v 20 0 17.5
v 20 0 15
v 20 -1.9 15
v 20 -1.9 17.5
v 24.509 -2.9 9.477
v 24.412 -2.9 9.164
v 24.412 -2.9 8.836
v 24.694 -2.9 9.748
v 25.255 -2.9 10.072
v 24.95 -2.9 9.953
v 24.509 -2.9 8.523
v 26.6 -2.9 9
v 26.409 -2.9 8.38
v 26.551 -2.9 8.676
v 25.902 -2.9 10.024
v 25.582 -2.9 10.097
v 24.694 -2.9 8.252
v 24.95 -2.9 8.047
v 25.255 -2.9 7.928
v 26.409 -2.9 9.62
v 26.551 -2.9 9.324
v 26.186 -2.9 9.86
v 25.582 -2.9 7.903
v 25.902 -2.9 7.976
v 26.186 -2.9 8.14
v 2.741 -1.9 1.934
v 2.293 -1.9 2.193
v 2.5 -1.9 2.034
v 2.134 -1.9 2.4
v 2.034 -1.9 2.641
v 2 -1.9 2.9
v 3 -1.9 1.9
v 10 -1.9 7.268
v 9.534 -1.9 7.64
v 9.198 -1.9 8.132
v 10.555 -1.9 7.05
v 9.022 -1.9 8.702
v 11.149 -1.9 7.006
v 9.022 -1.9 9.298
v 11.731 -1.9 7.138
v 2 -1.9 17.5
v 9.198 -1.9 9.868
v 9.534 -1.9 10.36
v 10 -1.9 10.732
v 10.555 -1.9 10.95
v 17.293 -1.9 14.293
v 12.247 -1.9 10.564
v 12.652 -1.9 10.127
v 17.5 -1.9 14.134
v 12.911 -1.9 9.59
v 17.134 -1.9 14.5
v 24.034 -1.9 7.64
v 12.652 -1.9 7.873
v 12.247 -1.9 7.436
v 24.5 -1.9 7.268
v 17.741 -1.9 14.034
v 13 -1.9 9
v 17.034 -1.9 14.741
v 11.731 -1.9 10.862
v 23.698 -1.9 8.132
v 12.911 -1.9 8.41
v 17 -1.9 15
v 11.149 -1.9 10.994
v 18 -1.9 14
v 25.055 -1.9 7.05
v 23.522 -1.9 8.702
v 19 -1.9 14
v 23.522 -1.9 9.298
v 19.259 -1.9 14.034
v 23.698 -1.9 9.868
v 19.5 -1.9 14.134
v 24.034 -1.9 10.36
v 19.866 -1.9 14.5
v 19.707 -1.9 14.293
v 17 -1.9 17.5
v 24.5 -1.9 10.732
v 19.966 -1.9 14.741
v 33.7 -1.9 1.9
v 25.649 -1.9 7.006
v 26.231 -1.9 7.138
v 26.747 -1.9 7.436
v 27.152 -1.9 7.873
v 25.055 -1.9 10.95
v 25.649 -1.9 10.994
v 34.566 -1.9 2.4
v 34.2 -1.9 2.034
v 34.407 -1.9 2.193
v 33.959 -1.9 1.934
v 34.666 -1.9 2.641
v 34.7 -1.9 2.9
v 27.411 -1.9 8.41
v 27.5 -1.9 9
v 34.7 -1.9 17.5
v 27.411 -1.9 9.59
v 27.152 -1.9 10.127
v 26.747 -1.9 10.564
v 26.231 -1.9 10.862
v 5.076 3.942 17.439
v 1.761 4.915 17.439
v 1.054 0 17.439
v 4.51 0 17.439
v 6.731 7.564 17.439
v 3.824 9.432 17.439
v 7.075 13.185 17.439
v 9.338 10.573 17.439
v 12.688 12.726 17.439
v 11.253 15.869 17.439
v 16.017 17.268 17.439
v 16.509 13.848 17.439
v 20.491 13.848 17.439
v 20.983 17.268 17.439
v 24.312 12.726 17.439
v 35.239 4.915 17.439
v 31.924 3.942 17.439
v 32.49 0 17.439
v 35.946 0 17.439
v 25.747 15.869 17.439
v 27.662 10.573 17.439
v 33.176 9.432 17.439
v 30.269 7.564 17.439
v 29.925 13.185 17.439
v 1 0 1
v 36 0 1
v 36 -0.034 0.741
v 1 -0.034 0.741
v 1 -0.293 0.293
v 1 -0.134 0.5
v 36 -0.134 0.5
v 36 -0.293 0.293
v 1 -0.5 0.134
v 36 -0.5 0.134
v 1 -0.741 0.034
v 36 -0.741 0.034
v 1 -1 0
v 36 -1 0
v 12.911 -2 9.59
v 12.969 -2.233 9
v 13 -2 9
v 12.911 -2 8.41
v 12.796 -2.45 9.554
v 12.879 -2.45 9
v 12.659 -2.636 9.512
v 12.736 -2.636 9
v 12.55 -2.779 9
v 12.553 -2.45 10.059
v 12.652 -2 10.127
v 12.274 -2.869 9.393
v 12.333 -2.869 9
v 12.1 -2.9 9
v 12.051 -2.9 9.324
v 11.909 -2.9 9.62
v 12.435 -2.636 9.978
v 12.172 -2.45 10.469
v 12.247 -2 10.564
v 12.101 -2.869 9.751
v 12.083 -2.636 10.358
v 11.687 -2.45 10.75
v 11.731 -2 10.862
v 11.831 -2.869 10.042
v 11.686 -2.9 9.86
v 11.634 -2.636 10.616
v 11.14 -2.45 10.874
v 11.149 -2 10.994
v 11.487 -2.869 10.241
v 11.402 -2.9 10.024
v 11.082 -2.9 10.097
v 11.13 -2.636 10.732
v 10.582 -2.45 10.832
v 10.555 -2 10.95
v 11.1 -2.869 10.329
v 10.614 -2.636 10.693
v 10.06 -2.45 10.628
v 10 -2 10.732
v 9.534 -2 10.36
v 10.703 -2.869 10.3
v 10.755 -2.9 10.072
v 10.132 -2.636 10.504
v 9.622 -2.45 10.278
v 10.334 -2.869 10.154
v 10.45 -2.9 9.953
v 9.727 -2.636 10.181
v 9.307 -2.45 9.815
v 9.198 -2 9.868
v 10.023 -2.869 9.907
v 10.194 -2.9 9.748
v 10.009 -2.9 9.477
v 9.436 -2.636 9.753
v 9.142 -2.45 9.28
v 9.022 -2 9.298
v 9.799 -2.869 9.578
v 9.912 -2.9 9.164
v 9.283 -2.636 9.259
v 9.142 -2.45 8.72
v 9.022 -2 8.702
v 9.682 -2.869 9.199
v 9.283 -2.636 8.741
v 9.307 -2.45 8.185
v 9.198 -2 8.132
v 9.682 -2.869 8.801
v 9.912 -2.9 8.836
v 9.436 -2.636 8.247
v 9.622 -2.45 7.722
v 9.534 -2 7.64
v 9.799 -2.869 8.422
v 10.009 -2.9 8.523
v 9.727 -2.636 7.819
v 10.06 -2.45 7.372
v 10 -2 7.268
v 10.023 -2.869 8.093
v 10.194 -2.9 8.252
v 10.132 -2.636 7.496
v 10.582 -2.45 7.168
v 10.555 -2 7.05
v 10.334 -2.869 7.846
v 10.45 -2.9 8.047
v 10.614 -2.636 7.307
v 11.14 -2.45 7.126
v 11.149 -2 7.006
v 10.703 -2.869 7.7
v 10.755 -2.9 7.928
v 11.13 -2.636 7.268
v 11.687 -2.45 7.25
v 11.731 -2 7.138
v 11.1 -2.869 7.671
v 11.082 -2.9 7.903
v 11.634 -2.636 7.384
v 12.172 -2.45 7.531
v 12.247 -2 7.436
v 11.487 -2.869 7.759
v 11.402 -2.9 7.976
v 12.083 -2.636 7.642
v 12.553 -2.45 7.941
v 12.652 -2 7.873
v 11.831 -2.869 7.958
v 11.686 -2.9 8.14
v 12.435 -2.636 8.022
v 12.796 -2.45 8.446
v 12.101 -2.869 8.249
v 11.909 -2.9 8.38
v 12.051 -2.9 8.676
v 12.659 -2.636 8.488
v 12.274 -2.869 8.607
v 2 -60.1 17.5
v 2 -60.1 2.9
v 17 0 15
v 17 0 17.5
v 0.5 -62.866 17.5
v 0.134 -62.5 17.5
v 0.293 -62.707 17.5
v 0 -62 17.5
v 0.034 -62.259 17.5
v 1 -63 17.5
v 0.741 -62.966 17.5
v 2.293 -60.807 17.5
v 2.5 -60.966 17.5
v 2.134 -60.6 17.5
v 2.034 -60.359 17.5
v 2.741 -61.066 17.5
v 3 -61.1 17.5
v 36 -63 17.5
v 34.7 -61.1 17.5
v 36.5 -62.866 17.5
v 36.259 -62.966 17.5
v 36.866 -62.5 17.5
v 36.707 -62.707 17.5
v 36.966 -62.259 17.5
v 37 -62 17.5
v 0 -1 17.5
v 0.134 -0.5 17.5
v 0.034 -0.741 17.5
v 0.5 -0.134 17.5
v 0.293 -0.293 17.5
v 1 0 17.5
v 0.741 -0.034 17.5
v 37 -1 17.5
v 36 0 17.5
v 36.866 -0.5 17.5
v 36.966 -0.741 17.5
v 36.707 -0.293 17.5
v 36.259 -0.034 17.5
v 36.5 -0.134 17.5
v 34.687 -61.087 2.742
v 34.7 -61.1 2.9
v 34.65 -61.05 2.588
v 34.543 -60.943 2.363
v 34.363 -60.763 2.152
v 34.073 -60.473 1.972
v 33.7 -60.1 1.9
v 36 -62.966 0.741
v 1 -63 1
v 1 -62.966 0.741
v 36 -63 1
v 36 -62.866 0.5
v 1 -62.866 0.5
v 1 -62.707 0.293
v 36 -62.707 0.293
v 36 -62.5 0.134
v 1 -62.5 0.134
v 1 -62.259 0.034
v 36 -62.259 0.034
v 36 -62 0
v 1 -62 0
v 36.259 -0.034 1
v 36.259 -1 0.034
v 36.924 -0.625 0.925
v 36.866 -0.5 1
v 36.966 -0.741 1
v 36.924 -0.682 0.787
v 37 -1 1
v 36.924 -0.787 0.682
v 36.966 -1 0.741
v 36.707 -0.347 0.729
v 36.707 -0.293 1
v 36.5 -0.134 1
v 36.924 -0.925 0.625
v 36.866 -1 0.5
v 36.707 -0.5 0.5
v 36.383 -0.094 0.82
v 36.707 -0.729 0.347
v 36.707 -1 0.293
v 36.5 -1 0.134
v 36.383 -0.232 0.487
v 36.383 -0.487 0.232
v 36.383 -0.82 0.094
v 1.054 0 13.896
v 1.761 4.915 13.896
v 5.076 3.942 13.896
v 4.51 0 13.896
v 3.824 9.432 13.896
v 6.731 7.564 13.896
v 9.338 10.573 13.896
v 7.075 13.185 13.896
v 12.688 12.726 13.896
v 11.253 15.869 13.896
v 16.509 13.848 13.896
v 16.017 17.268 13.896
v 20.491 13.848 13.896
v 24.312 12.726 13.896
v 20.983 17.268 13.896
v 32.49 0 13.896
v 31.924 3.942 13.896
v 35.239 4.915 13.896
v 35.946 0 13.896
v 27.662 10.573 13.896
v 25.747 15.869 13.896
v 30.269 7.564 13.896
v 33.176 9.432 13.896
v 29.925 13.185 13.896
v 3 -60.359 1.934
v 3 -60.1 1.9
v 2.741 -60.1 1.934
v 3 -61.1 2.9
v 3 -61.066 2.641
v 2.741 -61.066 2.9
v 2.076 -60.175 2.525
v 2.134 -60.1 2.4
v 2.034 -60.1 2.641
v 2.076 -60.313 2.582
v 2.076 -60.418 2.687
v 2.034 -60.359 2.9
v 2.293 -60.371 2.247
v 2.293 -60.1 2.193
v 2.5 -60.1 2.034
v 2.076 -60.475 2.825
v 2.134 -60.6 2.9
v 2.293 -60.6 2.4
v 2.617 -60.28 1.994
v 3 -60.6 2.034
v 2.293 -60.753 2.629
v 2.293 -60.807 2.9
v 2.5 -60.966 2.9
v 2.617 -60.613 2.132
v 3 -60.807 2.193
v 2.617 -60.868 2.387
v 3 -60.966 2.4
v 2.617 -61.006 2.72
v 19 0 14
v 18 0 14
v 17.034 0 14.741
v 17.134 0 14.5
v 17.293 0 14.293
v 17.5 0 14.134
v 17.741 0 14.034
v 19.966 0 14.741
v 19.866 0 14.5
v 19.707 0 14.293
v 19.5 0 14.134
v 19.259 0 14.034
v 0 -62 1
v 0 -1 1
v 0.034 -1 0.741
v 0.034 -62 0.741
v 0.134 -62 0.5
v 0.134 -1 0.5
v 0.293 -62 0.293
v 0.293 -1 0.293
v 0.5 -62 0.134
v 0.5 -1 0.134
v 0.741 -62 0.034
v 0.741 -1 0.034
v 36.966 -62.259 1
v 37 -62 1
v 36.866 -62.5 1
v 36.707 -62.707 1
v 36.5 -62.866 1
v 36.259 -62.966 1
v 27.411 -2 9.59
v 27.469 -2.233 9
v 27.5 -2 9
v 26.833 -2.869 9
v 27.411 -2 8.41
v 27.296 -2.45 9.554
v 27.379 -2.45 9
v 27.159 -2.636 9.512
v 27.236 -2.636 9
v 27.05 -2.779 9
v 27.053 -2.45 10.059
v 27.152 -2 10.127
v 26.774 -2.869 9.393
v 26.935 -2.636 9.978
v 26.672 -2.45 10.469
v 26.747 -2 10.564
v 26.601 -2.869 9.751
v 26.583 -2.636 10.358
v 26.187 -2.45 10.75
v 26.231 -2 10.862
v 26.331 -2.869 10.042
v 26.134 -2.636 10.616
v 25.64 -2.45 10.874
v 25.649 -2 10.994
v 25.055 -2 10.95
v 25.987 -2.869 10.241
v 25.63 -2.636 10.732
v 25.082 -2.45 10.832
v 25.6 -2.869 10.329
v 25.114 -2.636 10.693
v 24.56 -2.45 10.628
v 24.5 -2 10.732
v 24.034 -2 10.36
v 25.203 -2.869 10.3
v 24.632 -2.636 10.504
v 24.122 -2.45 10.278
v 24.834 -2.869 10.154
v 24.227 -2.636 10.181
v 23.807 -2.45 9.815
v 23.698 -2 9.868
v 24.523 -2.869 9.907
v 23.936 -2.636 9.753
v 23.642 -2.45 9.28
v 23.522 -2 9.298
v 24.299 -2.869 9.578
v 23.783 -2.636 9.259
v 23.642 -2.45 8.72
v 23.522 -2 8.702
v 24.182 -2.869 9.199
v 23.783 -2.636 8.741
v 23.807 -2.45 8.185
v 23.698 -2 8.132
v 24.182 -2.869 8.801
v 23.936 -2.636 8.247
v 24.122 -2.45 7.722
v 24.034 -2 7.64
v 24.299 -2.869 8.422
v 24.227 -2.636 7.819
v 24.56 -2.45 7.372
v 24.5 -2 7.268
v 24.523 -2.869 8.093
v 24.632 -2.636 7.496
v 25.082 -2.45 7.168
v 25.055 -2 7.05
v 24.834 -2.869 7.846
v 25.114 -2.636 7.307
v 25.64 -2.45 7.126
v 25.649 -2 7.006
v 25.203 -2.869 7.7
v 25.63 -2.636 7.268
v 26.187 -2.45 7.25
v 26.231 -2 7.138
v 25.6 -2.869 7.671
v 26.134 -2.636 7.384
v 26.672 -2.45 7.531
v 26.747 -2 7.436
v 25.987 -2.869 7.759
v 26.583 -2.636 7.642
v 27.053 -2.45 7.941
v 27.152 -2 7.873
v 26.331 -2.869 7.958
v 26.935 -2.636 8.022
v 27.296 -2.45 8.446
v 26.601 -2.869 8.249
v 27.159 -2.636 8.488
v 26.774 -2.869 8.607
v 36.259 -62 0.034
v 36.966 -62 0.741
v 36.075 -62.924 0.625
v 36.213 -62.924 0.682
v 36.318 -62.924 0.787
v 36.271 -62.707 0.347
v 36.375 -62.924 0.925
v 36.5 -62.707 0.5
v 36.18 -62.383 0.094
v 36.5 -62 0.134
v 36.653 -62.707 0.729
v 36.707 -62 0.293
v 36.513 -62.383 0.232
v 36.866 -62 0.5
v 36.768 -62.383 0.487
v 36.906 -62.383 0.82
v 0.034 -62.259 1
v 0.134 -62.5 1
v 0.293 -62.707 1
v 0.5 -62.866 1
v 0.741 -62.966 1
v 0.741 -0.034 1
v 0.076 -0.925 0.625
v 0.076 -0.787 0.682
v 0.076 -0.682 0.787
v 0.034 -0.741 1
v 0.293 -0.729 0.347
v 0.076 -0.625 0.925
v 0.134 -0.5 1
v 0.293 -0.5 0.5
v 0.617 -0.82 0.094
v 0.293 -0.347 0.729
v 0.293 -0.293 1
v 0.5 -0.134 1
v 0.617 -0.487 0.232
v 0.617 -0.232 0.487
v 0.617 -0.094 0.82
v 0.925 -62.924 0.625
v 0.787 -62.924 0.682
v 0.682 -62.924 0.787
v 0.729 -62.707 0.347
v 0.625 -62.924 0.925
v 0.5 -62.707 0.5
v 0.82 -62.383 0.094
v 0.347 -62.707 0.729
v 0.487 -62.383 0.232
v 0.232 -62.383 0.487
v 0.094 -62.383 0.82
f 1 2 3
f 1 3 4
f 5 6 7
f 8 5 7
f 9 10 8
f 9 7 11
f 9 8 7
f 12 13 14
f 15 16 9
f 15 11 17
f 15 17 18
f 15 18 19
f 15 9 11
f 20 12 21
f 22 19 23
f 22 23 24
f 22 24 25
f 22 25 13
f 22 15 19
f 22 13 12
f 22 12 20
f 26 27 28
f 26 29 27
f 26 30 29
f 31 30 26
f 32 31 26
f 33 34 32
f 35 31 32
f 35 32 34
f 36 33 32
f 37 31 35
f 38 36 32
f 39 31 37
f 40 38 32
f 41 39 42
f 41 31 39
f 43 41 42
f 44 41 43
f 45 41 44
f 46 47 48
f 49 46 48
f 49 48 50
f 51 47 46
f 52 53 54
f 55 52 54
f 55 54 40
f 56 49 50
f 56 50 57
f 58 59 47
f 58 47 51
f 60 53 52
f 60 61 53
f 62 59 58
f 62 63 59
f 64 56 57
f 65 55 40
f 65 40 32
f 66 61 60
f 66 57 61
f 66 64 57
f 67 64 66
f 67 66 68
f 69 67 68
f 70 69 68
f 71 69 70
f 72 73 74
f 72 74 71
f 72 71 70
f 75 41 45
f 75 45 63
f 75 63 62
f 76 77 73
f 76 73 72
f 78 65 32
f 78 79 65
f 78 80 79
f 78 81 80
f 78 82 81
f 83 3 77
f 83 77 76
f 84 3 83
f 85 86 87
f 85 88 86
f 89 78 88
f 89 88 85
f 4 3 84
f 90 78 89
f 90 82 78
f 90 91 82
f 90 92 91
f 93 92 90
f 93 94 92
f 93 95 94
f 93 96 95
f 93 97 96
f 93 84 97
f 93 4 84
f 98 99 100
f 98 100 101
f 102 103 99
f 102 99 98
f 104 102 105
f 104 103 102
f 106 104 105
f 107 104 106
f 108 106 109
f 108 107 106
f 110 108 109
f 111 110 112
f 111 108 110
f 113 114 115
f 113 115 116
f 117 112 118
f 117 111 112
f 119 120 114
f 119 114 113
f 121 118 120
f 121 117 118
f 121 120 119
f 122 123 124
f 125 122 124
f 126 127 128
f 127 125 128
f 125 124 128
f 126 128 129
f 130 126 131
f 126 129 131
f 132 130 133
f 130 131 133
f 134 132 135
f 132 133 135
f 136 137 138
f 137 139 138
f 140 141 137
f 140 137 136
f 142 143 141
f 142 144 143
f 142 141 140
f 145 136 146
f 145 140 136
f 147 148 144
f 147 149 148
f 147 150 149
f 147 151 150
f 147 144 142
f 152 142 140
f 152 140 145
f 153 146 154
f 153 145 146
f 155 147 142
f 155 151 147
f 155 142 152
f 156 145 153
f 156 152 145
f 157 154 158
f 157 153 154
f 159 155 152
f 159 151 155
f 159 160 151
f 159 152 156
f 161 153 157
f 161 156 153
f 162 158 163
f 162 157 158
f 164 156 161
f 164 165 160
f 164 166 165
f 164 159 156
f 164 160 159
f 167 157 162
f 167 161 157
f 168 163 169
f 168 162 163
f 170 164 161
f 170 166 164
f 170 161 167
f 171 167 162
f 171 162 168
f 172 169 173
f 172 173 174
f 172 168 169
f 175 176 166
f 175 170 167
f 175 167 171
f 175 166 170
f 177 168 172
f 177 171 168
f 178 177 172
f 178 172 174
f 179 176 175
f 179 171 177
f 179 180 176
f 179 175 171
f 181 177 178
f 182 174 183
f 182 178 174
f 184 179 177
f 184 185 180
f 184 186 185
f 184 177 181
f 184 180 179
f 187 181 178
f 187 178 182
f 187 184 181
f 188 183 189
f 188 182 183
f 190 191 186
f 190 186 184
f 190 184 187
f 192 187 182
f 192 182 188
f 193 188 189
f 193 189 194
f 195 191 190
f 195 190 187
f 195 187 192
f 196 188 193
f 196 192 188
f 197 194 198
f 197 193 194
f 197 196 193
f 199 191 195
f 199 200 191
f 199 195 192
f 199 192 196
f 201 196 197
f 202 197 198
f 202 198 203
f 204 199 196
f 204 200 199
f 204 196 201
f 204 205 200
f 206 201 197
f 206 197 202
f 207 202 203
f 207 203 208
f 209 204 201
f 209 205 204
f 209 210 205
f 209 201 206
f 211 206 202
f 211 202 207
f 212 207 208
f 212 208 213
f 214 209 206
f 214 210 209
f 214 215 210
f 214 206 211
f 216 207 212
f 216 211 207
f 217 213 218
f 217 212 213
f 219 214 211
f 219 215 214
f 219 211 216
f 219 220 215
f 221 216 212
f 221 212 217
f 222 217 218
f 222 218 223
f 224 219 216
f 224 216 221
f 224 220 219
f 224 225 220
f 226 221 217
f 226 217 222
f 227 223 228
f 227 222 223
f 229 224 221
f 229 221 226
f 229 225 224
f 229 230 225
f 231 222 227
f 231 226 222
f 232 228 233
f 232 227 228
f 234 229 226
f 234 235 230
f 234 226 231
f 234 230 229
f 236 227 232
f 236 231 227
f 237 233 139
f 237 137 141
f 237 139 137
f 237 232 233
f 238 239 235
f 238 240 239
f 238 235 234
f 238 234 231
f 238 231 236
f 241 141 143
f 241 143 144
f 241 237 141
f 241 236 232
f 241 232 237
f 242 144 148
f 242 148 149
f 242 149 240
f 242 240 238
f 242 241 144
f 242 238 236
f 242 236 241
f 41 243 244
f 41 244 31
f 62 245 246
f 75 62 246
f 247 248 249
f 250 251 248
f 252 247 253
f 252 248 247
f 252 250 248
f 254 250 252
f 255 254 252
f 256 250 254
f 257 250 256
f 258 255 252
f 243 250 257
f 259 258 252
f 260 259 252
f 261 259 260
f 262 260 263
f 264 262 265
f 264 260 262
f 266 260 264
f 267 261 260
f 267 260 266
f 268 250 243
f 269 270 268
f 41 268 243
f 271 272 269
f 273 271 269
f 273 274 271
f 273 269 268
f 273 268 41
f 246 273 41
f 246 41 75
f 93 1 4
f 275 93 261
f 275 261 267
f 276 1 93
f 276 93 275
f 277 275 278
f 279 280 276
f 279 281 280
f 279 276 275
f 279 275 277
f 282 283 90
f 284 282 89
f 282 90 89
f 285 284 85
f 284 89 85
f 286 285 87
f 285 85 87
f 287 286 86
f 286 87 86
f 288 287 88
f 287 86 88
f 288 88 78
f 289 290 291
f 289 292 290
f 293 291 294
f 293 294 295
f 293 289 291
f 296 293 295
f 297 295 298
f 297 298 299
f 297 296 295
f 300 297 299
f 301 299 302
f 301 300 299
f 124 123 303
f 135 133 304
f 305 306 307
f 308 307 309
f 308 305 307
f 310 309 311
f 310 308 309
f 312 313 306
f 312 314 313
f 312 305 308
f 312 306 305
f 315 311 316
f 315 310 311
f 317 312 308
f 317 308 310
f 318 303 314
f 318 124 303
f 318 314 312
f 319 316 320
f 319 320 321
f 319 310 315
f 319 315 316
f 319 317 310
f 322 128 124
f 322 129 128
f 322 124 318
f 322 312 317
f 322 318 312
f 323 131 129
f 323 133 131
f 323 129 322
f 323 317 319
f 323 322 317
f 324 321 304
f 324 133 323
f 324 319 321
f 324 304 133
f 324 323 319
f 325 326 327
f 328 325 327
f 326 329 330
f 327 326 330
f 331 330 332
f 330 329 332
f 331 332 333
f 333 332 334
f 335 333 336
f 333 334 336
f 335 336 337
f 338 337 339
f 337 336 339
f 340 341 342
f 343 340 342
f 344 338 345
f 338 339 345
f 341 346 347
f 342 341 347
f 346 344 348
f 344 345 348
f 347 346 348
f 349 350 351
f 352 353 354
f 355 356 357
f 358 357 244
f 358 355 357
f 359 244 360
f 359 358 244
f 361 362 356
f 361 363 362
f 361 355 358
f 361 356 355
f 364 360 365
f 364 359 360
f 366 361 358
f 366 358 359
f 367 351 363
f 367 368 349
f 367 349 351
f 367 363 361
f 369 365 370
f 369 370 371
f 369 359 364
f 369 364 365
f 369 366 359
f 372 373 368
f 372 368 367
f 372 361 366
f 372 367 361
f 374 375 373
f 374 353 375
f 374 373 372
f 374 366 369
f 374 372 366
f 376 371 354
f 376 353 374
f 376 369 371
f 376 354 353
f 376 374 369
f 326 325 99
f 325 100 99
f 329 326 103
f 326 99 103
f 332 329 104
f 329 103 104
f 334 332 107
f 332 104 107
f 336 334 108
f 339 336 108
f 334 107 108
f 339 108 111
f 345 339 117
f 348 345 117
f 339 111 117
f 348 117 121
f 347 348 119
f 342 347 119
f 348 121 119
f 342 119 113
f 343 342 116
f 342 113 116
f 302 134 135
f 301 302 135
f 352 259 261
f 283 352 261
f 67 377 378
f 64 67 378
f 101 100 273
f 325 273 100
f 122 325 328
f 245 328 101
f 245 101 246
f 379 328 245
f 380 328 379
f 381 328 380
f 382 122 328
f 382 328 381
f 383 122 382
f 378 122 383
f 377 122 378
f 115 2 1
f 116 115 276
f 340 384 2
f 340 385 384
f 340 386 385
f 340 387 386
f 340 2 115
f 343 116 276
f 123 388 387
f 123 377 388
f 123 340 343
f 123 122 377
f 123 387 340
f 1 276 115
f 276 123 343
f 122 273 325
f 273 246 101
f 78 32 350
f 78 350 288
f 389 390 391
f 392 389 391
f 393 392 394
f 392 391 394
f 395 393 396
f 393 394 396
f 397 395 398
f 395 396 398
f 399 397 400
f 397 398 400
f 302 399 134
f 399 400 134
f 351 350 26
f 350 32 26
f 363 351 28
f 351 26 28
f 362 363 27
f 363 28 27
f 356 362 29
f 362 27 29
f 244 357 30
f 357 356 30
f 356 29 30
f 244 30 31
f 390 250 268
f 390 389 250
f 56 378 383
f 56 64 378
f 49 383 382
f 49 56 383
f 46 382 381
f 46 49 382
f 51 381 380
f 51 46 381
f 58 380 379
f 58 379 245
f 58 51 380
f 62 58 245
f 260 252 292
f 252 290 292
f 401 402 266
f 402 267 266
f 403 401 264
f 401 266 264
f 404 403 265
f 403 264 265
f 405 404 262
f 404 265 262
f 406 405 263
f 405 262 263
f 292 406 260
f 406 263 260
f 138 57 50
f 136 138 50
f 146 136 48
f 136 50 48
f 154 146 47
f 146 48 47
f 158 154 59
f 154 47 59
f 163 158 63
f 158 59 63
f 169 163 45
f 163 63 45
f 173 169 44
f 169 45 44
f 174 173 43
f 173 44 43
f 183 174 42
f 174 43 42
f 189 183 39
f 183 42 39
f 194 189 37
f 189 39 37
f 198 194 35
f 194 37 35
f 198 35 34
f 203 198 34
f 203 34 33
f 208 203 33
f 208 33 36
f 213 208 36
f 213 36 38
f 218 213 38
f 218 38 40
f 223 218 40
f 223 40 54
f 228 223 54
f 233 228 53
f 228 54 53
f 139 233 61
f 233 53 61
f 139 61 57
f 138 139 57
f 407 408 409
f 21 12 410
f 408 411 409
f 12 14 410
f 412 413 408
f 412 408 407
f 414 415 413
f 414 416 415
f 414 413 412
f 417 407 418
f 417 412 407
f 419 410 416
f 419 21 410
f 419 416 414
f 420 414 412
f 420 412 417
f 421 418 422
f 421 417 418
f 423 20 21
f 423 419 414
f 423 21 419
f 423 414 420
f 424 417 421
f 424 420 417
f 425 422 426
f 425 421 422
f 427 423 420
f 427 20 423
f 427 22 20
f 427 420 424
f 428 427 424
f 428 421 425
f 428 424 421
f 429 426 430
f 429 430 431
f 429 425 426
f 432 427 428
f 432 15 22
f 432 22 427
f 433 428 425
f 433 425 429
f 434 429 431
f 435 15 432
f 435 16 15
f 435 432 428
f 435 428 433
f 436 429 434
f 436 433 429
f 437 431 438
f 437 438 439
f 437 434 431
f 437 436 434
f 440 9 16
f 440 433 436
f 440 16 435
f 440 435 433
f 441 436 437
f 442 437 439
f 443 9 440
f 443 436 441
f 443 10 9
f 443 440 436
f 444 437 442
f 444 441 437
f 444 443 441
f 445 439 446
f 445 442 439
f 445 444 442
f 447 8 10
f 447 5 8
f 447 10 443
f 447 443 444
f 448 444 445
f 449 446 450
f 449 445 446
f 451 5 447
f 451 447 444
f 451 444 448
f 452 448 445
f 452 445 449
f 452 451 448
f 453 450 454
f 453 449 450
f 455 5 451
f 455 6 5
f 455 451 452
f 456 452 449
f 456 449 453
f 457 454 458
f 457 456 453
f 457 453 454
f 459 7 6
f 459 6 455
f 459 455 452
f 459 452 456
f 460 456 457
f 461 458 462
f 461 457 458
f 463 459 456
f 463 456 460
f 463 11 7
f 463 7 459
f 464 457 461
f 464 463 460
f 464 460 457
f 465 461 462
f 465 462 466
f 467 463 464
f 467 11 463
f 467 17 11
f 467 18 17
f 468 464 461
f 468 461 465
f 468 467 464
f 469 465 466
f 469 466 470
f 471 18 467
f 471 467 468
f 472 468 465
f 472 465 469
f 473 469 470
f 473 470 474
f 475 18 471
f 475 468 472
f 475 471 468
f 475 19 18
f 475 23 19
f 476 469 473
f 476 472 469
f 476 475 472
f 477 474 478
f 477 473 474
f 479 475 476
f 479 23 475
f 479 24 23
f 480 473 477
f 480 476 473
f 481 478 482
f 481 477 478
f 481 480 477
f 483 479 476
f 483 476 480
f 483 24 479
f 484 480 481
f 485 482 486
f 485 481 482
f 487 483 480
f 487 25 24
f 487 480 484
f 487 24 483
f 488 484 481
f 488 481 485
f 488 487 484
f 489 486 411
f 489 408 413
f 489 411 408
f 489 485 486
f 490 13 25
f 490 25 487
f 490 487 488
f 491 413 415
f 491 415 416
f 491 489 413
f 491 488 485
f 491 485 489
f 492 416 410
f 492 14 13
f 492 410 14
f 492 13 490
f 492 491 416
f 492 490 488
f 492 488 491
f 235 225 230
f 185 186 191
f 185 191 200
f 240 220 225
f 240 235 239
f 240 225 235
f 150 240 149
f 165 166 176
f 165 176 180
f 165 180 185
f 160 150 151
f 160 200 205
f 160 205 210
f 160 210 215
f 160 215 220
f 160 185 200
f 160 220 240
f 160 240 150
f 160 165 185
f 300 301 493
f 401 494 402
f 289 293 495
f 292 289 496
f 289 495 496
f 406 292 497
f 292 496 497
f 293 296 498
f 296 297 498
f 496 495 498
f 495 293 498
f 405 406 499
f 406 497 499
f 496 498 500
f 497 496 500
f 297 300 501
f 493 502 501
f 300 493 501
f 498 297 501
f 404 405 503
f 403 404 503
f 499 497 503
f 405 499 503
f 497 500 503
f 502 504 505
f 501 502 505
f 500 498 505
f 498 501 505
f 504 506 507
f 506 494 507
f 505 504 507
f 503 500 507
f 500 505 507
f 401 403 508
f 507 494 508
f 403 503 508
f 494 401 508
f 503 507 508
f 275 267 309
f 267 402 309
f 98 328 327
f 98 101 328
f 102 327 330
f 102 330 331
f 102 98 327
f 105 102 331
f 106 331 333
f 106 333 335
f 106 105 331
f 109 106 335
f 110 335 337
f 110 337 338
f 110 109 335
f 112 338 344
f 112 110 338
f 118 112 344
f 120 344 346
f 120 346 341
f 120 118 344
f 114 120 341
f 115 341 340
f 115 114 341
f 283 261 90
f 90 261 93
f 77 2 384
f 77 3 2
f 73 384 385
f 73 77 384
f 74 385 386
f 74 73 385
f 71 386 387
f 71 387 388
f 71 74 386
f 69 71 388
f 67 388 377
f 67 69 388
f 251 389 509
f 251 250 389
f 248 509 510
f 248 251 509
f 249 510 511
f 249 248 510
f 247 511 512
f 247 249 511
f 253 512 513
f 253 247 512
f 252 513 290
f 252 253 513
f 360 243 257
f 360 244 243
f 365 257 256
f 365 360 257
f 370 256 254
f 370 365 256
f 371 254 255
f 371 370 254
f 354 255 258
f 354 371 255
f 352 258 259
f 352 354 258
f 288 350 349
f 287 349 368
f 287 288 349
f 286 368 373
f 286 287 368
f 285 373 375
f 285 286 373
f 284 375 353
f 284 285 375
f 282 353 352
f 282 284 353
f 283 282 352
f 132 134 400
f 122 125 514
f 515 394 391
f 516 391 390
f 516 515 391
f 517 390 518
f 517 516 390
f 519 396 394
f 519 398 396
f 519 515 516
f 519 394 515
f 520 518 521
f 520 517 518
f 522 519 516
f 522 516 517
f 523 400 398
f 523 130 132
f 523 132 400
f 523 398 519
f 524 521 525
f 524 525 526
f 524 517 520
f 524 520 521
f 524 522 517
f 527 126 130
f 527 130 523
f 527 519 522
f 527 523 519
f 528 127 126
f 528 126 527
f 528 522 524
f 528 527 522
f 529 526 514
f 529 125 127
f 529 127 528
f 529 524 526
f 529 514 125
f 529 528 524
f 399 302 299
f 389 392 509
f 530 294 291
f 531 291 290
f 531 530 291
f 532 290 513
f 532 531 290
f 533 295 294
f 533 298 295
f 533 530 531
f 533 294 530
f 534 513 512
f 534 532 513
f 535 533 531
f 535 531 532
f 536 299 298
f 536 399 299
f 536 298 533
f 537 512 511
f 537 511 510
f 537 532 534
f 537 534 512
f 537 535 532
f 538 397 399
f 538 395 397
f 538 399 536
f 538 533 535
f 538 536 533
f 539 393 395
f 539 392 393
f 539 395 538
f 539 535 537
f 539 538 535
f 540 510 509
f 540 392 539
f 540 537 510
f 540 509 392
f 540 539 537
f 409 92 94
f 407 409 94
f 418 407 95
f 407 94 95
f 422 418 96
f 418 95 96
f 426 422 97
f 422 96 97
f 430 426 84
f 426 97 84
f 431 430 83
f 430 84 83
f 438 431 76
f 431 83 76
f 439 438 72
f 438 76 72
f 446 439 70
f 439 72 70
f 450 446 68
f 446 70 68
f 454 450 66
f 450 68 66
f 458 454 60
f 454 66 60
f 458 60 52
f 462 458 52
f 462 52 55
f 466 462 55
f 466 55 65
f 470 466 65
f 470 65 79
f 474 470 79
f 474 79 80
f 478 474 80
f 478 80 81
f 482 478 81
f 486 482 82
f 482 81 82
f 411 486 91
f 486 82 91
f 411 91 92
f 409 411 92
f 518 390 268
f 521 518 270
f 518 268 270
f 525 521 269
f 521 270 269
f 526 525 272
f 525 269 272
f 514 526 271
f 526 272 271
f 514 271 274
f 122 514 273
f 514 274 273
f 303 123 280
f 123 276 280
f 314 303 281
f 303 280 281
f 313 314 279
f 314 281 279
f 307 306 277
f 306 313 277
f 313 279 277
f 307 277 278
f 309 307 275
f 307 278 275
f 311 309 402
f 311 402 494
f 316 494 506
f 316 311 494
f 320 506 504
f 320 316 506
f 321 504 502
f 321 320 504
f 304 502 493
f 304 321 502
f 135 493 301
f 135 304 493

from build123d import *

# Parameters (mm, degrees)
SKETCH_W         = 37
SKETCH_H         = 63
PAD_DEPTH        = 17.5
SKETCH001_W      = 32.7
SKETCH001_H      = 59.2
POCKET_DEPTH     = 15.6
SKETCH002_R      = 2
PAD001_DEPTH     = 1
FILLET_R         = 0.9
FILLET001_R      = 0.9
SKETCH004_W      = 3
SKETCH004_H      = 13.390789
POCKET001_DEPTH  = 5
FILLET002_R      = 1
SKETCH005_W      = 3.455711
SKETCH005_H      = 3.543194
REVOLUTION_ANGLE = 180
FILLET003_R      = 1


with BuildPart() as part:
    # Sketch → Pad (new body)
    with BuildSketch(Plane.XY):
        with Locations((18.5, -31.5)):
            Rectangle(SKETCH_W, SKETCH_H)
    extrude(amount=PAD_DEPTH)

    # Sketch001 (on Face6 of Pad) → Pocket (cut)
    with BuildSketch(Plane.XY.offset(17.5)):
        with Locations((18.35, -31.5)):
            Rectangle(SKETCH001_W, SKETCH001_H)
    extrude(amount=-POCKET_DEPTH, mode=Mode.SUBTRACT)

    # Sketch002 (on Face10 of Pocket) → Pad001 (join)
    with BuildSketch(Plane.XZ.offset(1.9)):
        with Locations((11, 9)):
            Circle(SKETCH002_R)
        with Locations((25.5, 9)):
            Circle(SKETCH002_R)
    extrude(amount=PAD001_DEPTH)

    # Fillet
    fillet_edges = [part.edges().sort_by_distance(p)[0] for p in [
        (9, -2.9, 9),
    ]]
    fillet(fillet_edges, radius=FILLET_R)

    # Fillet001
    fillet001_edges = [part.edges().sort_by_distance(p)[0] for p in [
        (23.5, -2.9, 9),
    ]]
    fillet(fillet001_edges, radius=FILLET001_R)

    # Sketch004 (on Face11 of Fillet001) → Pocket001 (cut)
    with BuildSketch(Plane(origin=(0, 0, 0), x_dir=(-1, 0, 0), z_dir=(0, 1, 0))):
        with Locations((-18.5, 20.695394)):
            Rectangle(SKETCH004_W, SKETCH004_H)
    extrude(amount=-POCKET001_DEPTH, mode=Mode.SUBTRACT)

    # Fillet002
    fillet002_edges = [part.edges().sort_by_distance(p)[0] for p in [
        (18.5, 0, 0),
        (18.35, -61.1, 1.9),
        (13, -1.95, 9),
        (37, 0, 8.75),
        (9, -2, 9),
        (2, -31.5, 1.9),
        (34.7, -31.5, 1.9),
        (2, -61.1, 9.7),
        (37, -31.5, 0),
        (0, -31.5, 0),
        (18.5, -63, 0),
        (0, -63, 8.75),
        (37, -63, 8.75),
        (0, 0, 8.75),
    ]]
    fillet(fillet002_edges, radius=FILLET002_R)

    # Sketch005 (on Face15 of Fillet002) → Revolution (revolve)
    with BuildSketch(Plane(origin=(0, 0, 0), x_dir=(-1, 0, 0), z_dir=(0, 1, 0))):
        with Locations((-2.781869, 15.6677)):
            Rectangle(SKETCH005_W, SKETCH005_H)
    revolve(axis=Axis((18.5, 0, 22.777559), (0, 0, -1)), revolution_arc=REVOLUTION_ANGLE)

    # Fillet003
    fillet003_edges = [part.edges().sort_by_distance(p)[0] for p in [
        (17, -0.95, 14),
        (20, -0.95, 14),
    ]]
    fillet(fillet003_edges, radius=FILLET003_R)


solid = part.part
